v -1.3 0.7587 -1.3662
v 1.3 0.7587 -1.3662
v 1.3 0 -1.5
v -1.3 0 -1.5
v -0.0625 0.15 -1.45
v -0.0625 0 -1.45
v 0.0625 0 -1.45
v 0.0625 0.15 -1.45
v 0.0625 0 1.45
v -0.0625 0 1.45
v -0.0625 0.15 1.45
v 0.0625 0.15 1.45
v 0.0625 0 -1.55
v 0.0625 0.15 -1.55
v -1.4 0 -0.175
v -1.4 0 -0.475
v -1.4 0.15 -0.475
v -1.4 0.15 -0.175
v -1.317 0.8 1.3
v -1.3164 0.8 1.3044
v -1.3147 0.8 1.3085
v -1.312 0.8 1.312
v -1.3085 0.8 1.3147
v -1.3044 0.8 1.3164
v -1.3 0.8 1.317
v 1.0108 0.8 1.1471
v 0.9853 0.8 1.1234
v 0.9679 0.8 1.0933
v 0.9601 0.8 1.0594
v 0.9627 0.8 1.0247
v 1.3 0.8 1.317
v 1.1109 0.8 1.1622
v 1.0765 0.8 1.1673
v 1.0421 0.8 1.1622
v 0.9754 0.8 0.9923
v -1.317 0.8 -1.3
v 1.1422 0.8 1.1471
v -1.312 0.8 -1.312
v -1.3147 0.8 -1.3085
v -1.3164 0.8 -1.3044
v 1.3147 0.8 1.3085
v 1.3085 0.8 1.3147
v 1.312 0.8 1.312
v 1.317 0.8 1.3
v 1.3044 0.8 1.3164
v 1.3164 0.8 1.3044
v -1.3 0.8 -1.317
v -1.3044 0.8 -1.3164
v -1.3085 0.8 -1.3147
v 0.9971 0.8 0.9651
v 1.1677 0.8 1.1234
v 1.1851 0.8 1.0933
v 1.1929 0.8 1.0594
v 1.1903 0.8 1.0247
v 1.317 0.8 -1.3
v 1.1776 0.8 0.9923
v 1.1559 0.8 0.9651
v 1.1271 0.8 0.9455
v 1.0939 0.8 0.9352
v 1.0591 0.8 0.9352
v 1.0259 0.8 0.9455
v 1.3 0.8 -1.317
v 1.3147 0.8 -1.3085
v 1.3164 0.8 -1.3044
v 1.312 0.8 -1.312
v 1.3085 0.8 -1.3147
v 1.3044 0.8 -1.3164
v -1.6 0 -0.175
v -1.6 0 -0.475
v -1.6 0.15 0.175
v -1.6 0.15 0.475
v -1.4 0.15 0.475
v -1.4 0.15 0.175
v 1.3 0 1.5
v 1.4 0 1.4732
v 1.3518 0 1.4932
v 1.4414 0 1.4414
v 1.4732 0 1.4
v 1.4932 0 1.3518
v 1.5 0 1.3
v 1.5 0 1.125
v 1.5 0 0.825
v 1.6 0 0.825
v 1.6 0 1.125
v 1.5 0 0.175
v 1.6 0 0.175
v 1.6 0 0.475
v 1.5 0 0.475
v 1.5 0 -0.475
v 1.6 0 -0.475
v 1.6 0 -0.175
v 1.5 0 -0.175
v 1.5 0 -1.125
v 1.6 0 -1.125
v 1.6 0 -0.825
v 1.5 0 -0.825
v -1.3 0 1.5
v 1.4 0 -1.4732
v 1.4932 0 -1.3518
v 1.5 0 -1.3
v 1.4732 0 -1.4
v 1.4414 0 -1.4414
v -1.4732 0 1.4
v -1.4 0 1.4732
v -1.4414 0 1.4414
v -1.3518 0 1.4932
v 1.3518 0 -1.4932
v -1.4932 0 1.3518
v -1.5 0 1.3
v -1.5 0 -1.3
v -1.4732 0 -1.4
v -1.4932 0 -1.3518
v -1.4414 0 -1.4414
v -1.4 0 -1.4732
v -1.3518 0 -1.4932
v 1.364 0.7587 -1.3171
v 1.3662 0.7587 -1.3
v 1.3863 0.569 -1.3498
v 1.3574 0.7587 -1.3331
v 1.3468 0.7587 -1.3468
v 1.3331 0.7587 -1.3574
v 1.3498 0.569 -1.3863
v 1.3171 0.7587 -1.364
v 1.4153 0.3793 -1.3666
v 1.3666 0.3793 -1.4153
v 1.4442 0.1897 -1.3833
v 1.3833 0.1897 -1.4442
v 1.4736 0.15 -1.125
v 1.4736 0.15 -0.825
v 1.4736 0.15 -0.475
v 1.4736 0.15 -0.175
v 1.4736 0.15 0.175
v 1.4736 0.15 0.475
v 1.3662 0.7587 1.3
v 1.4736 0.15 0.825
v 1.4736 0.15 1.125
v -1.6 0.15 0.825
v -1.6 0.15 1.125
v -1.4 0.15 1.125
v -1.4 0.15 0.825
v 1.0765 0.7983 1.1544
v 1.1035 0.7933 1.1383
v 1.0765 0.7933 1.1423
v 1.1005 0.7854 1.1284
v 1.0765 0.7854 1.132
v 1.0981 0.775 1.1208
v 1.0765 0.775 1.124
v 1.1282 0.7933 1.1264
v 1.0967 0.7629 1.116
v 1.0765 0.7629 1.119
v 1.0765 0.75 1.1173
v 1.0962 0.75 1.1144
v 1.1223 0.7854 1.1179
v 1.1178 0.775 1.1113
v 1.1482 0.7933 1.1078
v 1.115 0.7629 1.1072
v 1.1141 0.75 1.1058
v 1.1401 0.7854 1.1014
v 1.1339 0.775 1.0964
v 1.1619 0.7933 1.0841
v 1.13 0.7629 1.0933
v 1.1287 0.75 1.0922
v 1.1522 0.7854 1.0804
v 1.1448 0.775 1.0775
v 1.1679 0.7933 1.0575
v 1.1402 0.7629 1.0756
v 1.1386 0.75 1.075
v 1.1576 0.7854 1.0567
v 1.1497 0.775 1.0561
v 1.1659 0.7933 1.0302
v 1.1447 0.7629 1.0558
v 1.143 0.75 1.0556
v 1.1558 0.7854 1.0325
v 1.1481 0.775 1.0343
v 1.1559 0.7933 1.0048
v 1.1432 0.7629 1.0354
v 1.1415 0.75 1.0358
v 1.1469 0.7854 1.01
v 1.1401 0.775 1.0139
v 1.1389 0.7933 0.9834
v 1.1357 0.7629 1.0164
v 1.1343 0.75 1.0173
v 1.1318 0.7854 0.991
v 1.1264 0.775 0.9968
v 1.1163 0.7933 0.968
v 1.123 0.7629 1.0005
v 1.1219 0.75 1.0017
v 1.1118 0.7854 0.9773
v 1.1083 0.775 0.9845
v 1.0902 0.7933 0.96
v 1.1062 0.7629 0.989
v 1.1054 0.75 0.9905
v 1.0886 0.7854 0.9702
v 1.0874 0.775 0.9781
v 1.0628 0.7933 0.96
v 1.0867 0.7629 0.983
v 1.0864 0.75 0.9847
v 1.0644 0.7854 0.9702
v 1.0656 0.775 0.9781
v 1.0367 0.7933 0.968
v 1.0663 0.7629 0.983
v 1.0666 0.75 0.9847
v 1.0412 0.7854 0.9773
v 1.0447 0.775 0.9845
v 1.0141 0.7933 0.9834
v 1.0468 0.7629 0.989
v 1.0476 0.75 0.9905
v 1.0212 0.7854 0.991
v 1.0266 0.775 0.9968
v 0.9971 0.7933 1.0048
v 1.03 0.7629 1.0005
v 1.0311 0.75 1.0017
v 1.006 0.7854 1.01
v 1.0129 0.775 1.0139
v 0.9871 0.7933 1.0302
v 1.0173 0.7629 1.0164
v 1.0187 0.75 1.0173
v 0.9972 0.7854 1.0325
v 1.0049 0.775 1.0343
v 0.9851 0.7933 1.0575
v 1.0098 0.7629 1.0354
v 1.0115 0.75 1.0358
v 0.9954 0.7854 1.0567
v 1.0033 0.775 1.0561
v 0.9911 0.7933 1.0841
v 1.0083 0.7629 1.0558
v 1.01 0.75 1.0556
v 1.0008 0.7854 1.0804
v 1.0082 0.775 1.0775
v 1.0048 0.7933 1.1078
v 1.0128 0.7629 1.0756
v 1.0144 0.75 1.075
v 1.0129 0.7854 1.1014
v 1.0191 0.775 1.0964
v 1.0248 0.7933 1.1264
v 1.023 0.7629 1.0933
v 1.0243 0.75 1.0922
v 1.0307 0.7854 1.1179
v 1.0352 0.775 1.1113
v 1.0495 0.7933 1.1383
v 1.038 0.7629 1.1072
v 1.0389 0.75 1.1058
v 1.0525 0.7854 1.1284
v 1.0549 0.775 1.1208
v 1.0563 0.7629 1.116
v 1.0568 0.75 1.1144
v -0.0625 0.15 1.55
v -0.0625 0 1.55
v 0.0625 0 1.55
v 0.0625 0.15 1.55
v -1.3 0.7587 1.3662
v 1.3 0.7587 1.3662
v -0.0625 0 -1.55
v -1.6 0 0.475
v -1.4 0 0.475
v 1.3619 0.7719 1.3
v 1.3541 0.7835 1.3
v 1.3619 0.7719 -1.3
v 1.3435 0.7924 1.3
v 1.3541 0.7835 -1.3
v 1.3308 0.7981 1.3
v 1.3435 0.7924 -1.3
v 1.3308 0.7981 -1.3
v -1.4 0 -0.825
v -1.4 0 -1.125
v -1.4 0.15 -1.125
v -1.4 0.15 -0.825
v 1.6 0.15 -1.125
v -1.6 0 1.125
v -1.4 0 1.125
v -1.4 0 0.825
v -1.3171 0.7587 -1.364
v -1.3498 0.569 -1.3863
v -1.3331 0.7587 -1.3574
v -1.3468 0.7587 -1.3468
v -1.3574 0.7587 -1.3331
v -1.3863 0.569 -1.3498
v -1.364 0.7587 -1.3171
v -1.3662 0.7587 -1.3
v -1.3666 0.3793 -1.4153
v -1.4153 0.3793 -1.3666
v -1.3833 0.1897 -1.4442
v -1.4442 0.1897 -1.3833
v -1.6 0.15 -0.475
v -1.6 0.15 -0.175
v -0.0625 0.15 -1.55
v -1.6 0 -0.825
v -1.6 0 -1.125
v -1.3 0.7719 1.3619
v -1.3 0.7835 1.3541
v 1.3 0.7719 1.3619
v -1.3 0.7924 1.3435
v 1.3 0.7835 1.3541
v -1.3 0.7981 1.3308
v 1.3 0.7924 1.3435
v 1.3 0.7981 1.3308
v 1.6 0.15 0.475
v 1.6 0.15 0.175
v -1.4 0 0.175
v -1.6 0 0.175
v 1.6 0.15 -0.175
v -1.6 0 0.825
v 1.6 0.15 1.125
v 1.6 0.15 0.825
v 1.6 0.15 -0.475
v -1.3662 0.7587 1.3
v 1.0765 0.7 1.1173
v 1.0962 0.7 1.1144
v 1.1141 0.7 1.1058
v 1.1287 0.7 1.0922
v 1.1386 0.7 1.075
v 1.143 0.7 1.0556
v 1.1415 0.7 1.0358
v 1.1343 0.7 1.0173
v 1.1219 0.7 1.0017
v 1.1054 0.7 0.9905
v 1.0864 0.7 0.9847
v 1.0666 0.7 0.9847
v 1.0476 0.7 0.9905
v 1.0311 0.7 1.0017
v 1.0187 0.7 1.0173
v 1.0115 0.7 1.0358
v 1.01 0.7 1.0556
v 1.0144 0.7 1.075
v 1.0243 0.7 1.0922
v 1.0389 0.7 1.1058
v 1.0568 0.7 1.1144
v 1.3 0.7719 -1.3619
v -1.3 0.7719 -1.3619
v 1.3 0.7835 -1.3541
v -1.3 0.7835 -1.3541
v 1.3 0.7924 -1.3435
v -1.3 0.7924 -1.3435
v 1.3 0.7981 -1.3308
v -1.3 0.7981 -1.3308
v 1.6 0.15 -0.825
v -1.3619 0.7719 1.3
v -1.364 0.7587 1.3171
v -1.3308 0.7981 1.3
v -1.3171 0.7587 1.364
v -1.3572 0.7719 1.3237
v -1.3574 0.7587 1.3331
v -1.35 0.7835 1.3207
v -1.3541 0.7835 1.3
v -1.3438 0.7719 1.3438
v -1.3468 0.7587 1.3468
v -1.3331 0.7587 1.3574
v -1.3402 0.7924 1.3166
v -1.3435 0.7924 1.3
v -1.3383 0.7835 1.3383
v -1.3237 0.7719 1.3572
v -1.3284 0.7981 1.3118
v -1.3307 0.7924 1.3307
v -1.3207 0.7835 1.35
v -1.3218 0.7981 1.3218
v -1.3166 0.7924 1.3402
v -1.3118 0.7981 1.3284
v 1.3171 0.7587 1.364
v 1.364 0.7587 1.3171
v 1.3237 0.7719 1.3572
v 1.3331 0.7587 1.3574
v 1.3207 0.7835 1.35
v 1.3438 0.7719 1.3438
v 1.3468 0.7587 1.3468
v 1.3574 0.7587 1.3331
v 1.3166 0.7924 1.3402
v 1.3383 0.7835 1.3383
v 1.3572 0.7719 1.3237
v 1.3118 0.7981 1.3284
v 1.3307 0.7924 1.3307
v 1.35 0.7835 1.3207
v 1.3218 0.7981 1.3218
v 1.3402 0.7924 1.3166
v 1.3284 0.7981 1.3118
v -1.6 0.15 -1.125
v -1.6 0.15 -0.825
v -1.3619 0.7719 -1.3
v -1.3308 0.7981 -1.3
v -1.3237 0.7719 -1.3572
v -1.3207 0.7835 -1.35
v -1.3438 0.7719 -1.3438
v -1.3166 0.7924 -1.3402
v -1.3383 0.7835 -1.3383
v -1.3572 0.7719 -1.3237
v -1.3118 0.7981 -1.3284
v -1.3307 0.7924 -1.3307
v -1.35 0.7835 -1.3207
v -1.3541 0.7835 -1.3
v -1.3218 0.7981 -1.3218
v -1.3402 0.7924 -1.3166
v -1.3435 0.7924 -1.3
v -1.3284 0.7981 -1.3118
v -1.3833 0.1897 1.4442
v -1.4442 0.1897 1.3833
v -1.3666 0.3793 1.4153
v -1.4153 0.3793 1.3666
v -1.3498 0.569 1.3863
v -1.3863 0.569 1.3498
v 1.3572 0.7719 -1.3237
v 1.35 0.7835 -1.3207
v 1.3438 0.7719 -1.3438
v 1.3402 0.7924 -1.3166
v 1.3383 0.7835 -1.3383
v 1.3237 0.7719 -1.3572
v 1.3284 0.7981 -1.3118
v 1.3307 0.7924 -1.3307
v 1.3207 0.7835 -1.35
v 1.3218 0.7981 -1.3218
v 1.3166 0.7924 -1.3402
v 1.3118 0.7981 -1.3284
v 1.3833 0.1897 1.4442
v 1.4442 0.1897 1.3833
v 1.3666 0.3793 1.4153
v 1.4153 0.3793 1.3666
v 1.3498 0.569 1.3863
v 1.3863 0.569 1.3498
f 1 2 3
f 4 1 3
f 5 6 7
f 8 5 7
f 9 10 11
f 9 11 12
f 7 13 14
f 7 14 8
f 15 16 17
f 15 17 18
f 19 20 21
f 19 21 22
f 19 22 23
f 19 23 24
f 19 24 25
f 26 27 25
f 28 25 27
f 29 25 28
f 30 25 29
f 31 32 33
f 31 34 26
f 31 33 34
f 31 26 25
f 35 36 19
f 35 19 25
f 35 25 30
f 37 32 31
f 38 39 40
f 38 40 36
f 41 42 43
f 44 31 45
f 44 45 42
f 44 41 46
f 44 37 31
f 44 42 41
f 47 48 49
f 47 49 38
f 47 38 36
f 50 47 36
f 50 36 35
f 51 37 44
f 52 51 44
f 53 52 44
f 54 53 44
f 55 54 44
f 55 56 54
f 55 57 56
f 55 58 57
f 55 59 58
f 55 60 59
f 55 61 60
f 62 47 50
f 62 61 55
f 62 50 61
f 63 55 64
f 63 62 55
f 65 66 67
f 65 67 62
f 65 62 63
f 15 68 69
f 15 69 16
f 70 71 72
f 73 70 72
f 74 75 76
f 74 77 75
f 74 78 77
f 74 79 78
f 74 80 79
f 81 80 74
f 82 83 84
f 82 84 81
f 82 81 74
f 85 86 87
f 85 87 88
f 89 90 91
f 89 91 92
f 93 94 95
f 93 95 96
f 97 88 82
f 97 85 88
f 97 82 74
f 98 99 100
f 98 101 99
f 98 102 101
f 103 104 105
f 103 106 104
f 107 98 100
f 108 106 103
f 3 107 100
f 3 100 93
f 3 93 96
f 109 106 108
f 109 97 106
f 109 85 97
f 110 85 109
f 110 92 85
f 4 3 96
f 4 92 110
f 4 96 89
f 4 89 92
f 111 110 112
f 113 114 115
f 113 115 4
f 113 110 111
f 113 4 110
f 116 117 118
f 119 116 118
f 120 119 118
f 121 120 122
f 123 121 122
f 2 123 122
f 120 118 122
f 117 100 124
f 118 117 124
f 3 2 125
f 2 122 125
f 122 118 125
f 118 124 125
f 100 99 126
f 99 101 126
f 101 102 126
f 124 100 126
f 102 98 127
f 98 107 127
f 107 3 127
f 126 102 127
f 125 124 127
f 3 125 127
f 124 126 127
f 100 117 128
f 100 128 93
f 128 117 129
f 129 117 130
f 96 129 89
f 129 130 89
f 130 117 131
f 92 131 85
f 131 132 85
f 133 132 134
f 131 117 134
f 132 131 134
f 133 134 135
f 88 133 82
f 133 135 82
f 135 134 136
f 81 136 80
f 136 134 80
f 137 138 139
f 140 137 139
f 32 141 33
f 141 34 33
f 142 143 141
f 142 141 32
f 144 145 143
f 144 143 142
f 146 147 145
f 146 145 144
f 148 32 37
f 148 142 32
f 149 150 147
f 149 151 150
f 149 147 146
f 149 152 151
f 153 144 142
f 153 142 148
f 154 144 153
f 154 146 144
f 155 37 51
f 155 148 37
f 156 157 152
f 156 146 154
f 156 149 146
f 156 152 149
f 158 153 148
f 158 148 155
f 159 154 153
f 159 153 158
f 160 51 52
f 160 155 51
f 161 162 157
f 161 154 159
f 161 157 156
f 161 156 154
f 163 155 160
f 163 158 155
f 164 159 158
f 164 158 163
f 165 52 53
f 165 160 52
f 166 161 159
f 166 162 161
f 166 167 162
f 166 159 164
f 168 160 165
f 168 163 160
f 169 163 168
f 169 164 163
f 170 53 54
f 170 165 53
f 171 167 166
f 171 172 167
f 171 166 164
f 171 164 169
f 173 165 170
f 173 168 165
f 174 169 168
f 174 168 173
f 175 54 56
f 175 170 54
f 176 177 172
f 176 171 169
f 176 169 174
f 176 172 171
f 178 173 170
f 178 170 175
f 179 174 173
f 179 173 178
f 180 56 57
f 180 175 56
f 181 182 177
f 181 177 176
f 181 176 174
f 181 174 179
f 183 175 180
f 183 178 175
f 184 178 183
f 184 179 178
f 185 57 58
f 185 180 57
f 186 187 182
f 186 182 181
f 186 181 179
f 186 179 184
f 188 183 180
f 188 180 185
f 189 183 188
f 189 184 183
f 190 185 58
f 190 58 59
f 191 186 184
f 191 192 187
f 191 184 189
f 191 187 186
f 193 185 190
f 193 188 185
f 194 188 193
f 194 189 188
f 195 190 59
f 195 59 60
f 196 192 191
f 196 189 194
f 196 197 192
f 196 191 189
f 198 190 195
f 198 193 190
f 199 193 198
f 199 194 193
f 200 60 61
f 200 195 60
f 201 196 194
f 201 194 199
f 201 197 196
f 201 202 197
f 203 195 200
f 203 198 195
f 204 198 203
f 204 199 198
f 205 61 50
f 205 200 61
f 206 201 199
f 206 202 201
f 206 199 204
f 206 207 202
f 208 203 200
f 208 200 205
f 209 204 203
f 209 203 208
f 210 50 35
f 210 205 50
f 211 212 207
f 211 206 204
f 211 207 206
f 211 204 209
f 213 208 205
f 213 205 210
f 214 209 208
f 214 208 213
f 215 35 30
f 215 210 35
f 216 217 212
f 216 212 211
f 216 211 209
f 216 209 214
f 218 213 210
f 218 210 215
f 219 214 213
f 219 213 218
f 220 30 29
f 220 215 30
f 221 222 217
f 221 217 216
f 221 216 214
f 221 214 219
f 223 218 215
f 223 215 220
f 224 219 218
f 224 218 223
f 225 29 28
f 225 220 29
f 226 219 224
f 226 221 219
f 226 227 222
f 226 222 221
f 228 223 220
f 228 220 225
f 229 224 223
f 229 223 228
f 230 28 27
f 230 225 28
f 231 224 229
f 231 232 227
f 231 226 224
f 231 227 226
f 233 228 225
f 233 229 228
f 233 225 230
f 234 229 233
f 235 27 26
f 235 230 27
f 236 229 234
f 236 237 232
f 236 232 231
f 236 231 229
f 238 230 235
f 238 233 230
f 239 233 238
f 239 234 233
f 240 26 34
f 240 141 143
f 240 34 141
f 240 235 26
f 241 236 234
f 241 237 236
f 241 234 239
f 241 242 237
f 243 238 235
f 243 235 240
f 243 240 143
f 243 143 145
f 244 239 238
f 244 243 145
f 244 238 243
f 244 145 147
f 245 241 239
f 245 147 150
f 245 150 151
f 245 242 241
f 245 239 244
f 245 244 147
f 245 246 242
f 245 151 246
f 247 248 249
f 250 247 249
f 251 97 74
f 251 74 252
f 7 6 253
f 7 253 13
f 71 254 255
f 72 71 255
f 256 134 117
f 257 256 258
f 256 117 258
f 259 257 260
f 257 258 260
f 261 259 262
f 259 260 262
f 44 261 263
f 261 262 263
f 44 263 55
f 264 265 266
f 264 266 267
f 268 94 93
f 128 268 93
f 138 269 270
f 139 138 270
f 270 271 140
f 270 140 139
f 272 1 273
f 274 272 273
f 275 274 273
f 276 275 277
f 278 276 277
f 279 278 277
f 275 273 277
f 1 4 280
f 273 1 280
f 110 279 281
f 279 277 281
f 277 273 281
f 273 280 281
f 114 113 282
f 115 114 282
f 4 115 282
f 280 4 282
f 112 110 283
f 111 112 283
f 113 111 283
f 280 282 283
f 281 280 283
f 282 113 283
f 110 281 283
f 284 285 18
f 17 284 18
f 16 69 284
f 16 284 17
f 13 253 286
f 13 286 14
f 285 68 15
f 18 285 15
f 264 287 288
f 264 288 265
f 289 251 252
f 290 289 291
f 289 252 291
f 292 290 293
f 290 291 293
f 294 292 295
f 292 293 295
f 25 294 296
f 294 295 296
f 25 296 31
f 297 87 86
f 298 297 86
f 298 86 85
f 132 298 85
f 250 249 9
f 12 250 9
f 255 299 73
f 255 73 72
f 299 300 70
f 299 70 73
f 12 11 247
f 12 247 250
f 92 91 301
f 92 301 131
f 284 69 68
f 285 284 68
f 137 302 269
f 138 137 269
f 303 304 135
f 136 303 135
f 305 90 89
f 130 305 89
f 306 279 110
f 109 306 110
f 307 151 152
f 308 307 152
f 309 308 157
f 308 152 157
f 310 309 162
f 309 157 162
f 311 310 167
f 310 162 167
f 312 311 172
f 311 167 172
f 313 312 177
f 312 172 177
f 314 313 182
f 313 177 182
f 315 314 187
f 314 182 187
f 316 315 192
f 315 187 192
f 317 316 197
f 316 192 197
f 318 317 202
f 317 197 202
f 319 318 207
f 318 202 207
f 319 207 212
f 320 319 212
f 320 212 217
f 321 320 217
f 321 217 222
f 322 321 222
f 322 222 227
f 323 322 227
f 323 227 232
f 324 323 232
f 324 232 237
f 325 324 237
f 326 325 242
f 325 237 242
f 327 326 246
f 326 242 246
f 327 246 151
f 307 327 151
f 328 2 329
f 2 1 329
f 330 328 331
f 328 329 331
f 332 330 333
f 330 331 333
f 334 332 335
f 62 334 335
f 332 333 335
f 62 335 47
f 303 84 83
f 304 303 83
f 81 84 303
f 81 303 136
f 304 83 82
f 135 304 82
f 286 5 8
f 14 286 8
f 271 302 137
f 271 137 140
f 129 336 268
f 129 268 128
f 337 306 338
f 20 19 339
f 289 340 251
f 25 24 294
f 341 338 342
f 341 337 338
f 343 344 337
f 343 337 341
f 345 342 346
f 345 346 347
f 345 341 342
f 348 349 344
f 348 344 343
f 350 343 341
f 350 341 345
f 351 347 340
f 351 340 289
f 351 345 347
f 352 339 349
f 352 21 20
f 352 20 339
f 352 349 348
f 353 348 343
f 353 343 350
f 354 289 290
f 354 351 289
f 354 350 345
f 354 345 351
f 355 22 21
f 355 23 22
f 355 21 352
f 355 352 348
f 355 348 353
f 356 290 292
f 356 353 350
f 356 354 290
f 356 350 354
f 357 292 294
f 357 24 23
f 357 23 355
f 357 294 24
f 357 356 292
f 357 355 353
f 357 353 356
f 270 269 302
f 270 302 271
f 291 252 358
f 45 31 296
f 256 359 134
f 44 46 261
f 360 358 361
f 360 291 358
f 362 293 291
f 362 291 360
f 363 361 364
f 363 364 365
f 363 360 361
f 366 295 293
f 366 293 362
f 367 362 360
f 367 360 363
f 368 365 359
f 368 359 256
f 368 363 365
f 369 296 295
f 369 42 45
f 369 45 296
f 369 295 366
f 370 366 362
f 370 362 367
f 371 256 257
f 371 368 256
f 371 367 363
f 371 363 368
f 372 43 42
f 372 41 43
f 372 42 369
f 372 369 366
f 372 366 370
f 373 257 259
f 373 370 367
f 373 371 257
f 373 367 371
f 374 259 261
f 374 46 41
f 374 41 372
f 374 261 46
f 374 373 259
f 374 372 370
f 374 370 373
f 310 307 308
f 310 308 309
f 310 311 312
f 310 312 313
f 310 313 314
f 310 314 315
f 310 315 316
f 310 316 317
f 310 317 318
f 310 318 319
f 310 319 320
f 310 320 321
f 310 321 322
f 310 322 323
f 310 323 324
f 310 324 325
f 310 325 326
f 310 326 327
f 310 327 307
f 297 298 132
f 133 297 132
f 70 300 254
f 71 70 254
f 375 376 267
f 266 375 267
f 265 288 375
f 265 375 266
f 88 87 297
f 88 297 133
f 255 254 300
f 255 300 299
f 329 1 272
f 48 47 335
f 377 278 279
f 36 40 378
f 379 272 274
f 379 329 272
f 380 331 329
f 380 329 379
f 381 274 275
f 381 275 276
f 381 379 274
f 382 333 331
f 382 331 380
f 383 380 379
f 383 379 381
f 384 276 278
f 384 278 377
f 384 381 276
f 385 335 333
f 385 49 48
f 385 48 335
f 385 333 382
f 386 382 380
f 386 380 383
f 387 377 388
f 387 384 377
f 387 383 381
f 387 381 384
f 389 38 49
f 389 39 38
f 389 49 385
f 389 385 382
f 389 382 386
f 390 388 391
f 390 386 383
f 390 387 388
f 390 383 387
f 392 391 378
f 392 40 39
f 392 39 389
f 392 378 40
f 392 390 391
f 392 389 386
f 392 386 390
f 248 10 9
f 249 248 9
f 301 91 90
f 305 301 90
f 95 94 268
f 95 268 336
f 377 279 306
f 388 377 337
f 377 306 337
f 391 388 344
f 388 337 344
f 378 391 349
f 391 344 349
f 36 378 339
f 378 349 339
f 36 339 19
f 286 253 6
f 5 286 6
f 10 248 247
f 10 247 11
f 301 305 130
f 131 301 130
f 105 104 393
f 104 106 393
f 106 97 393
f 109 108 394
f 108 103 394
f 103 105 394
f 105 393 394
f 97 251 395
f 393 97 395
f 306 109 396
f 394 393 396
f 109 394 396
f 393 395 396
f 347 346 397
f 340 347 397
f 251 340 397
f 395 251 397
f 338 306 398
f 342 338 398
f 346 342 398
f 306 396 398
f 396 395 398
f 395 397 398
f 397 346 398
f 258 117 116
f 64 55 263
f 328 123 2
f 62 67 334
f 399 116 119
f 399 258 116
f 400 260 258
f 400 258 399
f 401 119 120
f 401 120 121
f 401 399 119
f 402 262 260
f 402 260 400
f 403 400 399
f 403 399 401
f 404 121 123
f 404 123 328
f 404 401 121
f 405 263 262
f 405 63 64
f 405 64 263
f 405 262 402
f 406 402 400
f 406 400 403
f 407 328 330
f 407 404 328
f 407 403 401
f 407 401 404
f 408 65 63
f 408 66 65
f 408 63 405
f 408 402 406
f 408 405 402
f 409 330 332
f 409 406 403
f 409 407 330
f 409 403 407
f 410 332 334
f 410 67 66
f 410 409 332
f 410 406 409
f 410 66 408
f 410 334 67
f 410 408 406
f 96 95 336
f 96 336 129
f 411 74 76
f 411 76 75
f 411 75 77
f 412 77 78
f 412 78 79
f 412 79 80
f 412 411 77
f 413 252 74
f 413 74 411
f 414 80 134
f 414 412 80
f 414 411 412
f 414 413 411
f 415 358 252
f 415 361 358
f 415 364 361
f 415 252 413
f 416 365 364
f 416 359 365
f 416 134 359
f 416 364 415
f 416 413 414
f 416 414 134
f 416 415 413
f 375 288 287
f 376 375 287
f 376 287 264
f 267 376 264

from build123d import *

# Parameters (mm, degrees)
SKETCH1_W               = 3
SKETCH1_H               = 3
BOSS_EXTRUDE1_DEPTH     = 0.8
FILLET1_R               = 0.2
CHAMFER1_SIZE           = 0.8
CHAMFER1_SIZE_2         = 0.141061585
SKETCH2_W               = 0.2
SKETCH2_H               = 0.3
BOSS_EXTRUDE2_DEPTH     = 0.15
LPATTERN1_COUNT         = 4
LPATTERN1_PITCH         = 0.65
MIRROR2_COPY_1_SKETCH_W = 0.2
MIRROR2_COPY_1_SKETCH_H = 0.3
MIRROR2_COPY_1_DEPTH    = 0.15
MIRROR2_COPY_2_SKETCH_W = 0.2
MIRROR2_COPY_2_SKETCH_H = 0.3
MIRROR2_COPY_2_DEPTH    = 0.15
MIRROR2_COPY_3_SKETCH_W = 0.2
MIRROR2_COPY_3_SKETCH_H = 0.3
MIRROR2_COPY_3_DEPTH    = 0.15
SKETCH3_R               = 0.066703592
CUT_EXTRUDE1_DEPTH      = 0.1
SKETCH4_W               = 0.125
SKETCH4_H               = 0.1
BOSS_EXTRUDE3_DEPTH     = 0.15
FILLET2_R               = 0.05


with BuildPart() as part:
    # Sketch1 → Boss-Extrude1 (new body)
    with BuildSketch(Plane(origin=(0, 0, 0), x_dir=(1, 0, 0), z_dir=(0, 1, 0))):
        Rectangle(SKETCH1_W, SKETCH1_H)
    extrude(amount=BOSS_EXTRUDE1_DEPTH)

    # Fillet1
    fillet1_edges = [part.edges().sort_by_distance(p)[0] for p in [
        (1.5, 0.4, 1.5),
        (-1.5, 0.4, 1.5),
        (-1.5, 0.4, -1.5),
        (1.5, 0.4, -1.5),
    ]]
    fillet(fillet1_edges, radius=FILLET1_R)

    # Chamfer1
    # the kernel refuses this chamfer: 0.8, 0.141061585 mm, written as the material it takes off along each edge
    with BuildSketch(Plane(origin=(-1.3, 0.8, 1.5), x_dir=(0, -0.9999776716360547, 0.006682531656101619), z_dir=(1, 0, 0))) as chamfer1_piece_1:
        Polygon((CHAMFER1_SIZE * 0.999977671636, CHAMFER1_SIZE * 0.0066825316561), (-CHAMFER1_SIZE_2 * 0.00668253163558, CHAMFER1_SIZE_2 * 0.999977668565), (0, 0), align=None)
    extrude(amount=2.6, mode=Mode.SUBTRACT)
    with BuildSketch(Plane(origin=(-1.5, 0.8, -1.3), x_dir=(0.9776715712462587, 0.2101387607674316, 0), z_dir=(0, 0, 1)), Plane(origin=(1.3, 0.8, -1.5), x_dir=(0, 0.2101387607674316, 0.9776715712462587), z_dir=(-1, 0, 0)), Plane(origin=(1.5, 0.8, 1.3), x_dir=(-0.9776715712462587, 0.2101387607674316, 0), z_dir=(0, 0, -1))) as chamfer1_piece_2:
        Polygon((CHAMFER1_SIZE_2 * 0.977671568244, -CHAMFER1_SIZE_2 * 0.210138760122), (-CHAMFER1_SIZE * 0.210138760767, -CHAMFER1_SIZE * 0.977671571246), (0, 0), align=None)
    extrude(amount=2.6, mode=Mode.SUBTRACT)
    with BuildSketch(Plane(origin=(1.3, 0.8, -1.3), x_dir=(1, 0, 0), z_dir=(0, 0, 1))) as chamfer1_piece_3:
        Polygon((0.2 - CHAMFER1_SIZE_2 * 0.999999996929, 0), (0.2, -CHAMFER1_SIZE), (0.2, 0), align=None)
    revolve(axis=Axis((1.3, 0.8, -1.3), (0, 1, 0)), revolution_arc=90, mode=Mode.SUBTRACT)
    with BuildSketch(Plane(origin=(1.3, 0.8, 1.3), x_dir=(0, 0, 1), z_dir=(-1, 0, 0))) as chamfer1_piece_4:
        Polygon((0.2, -CHAMFER1_SIZE), (0.2 - CHAMFER1_SIZE_2 * 0.999999996929, 0), (0.2, 0), align=None)
    revolve(axis=Axis((1.3, 0.8, 1.3), (0, 1, 0)), revolution_arc=90, mode=Mode.SUBTRACT)
    with BuildSketch(Plane(origin=(-1.3, 0.8, 1.3), x_dir=(0, 0, 1), z_dir=(1, 0, 0))) as chamfer1_piece_5:
        Polygon((0.2, CHAMFER1_SIZE), (0.2 - CHAMFER1_SIZE_2 * 0.999999996929, 0), (0.2, 0), align=None)
    revolve(axis=Axis((-1.3, 0.8, 1.3), (0, -1, 0)), revolution_arc=90, mode=Mode.SUBTRACT)
    with BuildSketch(Plane(origin=(-1.3, 0.8, -1.3), x_dir=(0, 0, -1), z_dir=(1, 0, 0))) as chamfer1_piece_6:
        Polygon((0.2 - CHAMFER1_SIZE_2 * 0.999999996929, 0), (0.2, -CHAMFER1_SIZE), (0.2, 0), align=None)
    revolve(axis=Axis((-1.3, 0.8, -1.3), (0, 1, 0)), revolution_arc=90, mode=Mode.SUBTRACT)


with BuildPart() as body_2:
    # Sketch2 → Boss-Extrude2 (new body)
    with BuildSketch(Plane.XZ):
        with Locations((-1.5, -0.975)):
            Rectangle(SKETCH2_W, SKETCH2_H)
    boss_extrude2 = extrude(amount=-BOSS_EXTRUDE2_DEPTH)


with BuildPart() as lpattern1_1:
    # LPattern1: Boss-Extrude2 ×4
    with Locations(*[(0, 0, i * LPATTERN1_PITCH) for i in range(1, LPATTERN1_COUNT)]):
        add(boss_extrude2)


with BuildPart() as part_1:
    add(part.part)

    # Mirror2: Boss-Extrude2 across plane
    add(boss_extrude2.mirror(Plane.ZY))

    # Mirror2 copy 1 sketch → Mirror2 copy 1 (add)
    with BuildSketch(Plane(origin=(0, 0, 0.65), x_dir=(-1, 0, 0), z_dir=(0, -1, 0))):
        with Locations((-1.5, 0.975)):
            Rectangle(MIRROR2_COPY_1_SKETCH_W, MIRROR2_COPY_1_SKETCH_H)
    extrude(amount=-MIRROR2_COPY_1_DEPTH)

    # Mirror2 copy 2 sketch → Mirror2 copy 2 (add)
    with BuildSketch(Plane(origin=(0, 0, 1.3), x_dir=(-1, 0, 0), z_dir=(0, -1, 0))):
        with Locations((-1.5, 0.975)):
            Rectangle(MIRROR2_COPY_2_SKETCH_W, MIRROR2_COPY_2_SKETCH_H)
    extrude(amount=-MIRROR2_COPY_2_DEPTH)

    # Mirror2 copy 3 sketch → Mirror2 copy 3 (add)
    with BuildSketch(Plane(origin=(0, 0, 1.95), x_dir=(-1, 0, 0), z_dir=(0, -1, 0))):
        with Locations((-1.5, 0.975)):
            Rectangle(MIRROR2_COPY_3_SKETCH_W, MIRROR2_COPY_3_SKETCH_H)
    extrude(amount=-MIRROR2_COPY_3_DEPTH)

    # Sketch3 → Cut-Extrude1 (cut)
    with BuildSketch(Plane(origin=(0, 0.8, 0), x_dir=(1, 0, 0), z_dir=(0, 1, 0))):
        with Locations(Location((1.07649938, -1.050640543, 0), (0, 0, 270))):
            Circle(SKETCH3_R)
    extrude(amount=-CUT_EXTRUDE1_DEPTH, mode=Mode.SUBTRACT)

    # Fillet2
    fillet2_edges = [part_1.edges().sort_by_distance(p)[0] for p in [
        (1.07649938, 0.8, 0.983936951),
        (0, 0.8, -1.358938415),
        (-1.341675753, 0.8, -1.341675753),
        (-1.358938415, 0.8, 0),
        (-1.341675753, 0.8, 1.341675753),
        (0, 0.8, 1.358938415),
        (1.341675753, 0.8, 1.341675753),
        (1.358938415, 0.8, 0),
        (1.341675753, 0.8, -1.341675753),
    ]]
    fillet(fillet2_edges, radius=FILLET2_R)


with BuildPart() as body_6:
    # Sketch4 → Boss-Extrude3 (new body)
    with BuildSketch(Plane.XZ):
        with Locations((0, -1.5)):
            Rectangle(SKETCH4_W, SKETCH4_H)
    extrude(amount=-BOSS_EXTRUDE3_DEPTH)


with BuildPart() as body_7:
    # Mirror7: mirrored copy
    add(body_6.part.mirror(Plane.XY))


solid = Compound([body_2.part, lpattern1_1.part, part_1.part, body_6.part, body_7.part])
